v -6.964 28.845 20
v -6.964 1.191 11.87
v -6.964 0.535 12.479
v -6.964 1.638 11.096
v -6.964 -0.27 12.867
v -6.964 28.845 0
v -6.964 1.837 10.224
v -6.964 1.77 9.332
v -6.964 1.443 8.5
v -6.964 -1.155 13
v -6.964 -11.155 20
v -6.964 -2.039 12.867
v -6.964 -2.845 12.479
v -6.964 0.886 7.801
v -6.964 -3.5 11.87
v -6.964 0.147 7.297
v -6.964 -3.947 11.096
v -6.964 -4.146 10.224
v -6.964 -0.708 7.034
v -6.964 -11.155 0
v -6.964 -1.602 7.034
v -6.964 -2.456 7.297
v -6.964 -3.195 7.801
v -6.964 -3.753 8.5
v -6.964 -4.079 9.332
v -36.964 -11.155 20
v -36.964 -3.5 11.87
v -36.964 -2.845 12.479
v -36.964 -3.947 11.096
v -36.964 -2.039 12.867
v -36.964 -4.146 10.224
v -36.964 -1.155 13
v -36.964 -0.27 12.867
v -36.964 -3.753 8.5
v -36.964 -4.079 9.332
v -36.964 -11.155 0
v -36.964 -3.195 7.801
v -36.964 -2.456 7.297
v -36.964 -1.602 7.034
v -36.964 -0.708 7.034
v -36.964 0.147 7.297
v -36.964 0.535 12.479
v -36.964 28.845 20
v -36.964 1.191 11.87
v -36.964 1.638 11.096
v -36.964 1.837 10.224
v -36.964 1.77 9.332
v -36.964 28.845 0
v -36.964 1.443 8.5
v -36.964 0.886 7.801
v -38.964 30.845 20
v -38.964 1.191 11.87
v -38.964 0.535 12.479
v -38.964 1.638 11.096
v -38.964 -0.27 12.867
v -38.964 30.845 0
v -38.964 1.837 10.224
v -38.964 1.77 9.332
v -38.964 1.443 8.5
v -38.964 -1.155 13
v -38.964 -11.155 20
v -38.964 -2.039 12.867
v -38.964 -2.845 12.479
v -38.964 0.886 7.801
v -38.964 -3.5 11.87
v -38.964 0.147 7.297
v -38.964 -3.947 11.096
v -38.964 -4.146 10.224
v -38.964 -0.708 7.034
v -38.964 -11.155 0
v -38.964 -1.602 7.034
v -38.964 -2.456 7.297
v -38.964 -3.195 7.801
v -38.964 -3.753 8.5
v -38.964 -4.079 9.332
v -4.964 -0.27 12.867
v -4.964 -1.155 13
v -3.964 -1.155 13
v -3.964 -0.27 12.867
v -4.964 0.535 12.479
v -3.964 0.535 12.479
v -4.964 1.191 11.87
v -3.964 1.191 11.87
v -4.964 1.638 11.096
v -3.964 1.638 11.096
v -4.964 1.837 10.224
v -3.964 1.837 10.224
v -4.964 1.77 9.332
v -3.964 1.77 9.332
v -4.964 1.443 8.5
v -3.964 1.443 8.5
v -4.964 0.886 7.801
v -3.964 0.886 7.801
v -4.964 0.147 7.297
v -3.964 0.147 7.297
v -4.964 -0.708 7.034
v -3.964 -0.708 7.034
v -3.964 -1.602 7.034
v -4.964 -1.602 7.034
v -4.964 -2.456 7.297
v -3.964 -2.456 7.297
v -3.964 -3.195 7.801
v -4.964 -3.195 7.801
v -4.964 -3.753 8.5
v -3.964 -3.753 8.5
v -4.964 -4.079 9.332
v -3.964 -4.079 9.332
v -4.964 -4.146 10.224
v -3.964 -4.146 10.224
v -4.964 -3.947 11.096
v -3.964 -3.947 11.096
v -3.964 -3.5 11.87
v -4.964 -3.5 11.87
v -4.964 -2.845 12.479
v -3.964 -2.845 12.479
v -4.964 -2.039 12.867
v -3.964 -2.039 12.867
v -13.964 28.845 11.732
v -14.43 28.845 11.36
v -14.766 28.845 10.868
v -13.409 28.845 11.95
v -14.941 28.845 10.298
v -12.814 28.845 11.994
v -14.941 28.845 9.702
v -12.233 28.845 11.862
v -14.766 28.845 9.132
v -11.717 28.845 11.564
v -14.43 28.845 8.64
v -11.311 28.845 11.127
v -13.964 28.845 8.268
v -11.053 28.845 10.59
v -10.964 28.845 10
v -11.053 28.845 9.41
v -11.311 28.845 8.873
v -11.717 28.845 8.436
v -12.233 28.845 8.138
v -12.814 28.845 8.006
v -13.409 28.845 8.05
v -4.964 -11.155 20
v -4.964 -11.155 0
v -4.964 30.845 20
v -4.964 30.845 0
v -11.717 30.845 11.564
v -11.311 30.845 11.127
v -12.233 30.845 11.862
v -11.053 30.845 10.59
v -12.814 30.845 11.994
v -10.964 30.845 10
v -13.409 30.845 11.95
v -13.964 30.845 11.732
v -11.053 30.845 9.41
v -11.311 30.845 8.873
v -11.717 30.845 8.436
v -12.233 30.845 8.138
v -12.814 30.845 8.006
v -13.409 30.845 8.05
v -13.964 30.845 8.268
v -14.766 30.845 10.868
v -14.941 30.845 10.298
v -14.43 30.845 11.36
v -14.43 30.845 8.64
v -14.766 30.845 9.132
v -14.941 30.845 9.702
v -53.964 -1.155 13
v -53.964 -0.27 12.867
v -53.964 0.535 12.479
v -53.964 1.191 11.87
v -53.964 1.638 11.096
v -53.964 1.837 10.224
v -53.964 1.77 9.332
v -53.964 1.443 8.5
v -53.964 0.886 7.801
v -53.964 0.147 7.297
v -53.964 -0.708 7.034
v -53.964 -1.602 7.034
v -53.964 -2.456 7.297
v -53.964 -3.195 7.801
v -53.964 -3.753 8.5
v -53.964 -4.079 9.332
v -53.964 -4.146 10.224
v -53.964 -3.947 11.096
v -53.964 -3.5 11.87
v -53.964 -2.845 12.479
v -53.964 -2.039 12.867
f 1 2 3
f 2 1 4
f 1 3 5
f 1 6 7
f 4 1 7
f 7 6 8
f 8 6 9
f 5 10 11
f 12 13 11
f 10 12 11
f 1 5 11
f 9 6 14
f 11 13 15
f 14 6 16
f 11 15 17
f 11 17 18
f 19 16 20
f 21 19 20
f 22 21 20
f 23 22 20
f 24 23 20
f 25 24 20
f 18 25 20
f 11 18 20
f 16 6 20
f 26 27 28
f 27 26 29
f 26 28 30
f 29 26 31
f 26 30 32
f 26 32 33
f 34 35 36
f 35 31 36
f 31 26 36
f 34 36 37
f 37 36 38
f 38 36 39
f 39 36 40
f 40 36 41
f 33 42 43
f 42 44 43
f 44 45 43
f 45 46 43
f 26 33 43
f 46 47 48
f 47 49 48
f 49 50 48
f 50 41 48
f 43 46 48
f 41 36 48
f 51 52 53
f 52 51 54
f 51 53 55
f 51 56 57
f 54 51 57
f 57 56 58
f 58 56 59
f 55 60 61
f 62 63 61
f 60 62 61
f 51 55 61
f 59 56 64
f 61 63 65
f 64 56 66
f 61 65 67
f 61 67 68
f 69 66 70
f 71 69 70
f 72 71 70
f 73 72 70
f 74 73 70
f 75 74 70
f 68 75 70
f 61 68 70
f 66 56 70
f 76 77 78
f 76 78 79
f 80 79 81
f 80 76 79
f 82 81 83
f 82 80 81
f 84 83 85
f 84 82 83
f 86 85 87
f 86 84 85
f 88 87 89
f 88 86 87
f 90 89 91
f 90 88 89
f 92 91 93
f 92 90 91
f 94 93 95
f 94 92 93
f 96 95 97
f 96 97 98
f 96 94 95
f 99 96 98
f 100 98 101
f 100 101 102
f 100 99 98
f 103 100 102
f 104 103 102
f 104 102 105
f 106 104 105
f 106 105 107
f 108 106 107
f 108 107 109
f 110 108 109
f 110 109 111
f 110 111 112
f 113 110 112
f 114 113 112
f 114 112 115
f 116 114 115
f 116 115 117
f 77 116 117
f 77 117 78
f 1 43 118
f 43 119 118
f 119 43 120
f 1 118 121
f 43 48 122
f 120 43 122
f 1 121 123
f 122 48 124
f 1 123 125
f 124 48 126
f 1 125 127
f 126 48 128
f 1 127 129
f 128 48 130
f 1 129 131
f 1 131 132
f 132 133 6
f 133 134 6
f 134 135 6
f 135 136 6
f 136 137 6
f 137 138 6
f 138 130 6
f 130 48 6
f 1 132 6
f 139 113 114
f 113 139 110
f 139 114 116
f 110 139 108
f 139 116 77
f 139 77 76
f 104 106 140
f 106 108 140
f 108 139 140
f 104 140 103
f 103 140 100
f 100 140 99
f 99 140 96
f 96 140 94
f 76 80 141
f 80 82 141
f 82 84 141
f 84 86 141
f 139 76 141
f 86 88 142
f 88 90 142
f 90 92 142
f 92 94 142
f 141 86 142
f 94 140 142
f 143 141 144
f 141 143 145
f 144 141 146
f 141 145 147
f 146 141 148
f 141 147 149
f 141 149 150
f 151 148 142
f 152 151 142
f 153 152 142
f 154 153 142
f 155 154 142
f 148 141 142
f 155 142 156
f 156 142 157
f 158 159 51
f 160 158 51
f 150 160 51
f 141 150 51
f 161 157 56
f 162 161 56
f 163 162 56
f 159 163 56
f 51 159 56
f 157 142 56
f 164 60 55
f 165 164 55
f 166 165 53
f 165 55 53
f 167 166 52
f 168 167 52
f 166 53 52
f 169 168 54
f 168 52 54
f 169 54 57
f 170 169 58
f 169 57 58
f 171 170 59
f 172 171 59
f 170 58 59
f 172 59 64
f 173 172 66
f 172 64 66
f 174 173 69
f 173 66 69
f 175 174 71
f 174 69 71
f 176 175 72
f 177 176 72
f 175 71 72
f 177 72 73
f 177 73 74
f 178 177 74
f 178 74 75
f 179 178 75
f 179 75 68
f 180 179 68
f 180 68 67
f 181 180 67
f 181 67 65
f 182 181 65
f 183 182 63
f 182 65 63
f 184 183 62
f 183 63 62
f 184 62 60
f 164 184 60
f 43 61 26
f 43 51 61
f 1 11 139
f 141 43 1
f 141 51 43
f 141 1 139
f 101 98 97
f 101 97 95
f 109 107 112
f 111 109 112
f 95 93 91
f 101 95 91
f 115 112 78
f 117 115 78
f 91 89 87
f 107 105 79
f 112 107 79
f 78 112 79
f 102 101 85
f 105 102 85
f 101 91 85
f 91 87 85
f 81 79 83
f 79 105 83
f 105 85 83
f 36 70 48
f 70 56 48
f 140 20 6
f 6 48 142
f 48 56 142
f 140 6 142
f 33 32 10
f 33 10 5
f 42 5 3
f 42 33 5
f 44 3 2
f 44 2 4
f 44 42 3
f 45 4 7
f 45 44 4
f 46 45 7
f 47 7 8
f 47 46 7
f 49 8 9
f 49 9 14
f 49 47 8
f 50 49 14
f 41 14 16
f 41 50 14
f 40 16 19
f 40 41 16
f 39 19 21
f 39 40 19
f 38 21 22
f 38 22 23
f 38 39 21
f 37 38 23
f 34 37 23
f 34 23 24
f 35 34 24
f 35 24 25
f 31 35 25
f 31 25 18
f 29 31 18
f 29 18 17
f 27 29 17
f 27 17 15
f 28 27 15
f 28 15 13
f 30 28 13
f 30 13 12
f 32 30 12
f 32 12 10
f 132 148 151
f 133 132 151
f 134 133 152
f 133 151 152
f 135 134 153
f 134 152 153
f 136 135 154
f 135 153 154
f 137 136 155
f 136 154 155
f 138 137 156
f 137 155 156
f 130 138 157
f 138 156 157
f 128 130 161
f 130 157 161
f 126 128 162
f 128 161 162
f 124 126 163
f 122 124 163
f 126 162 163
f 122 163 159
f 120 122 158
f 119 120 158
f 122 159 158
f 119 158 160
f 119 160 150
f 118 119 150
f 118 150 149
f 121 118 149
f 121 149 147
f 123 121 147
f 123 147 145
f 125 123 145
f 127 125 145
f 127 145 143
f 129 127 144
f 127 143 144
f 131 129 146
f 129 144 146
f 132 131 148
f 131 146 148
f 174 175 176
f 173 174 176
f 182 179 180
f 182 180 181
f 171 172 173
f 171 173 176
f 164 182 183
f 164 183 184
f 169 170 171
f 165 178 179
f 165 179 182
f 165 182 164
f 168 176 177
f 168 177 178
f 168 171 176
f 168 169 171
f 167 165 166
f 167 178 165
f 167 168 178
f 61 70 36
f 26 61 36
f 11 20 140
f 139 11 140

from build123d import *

# Parameters (mm, degrees)
EXTRUDE_1_DEPTH      = 20
SKETCH_3_R           = 3
EXTRUDE_2_DEPTH      = 15
EXTRUDE_2_DEPTH_BACK = 35
SKETCH_4_R           = 2
CUT_EXTRUDE_1_DEPTH  = 2


with BuildPart() as part:
    # 草图1 → 凸台-拉伸1 (new body)
    with BuildSketch(Plane.XY):
        Polygon((-38.9636651, 28.845358616), (-38.9636651, -11.154641384), (-36.9636651, -11.154641384), (-36.9636651, 28.845358616), (-6.9636651, 28.845358616), (-6.9636651, -11.154641384), (-4.9636651, -11.154641384), (-4.9636651, 30.845358616), (-38.9636651, 30.845358616), align=None)
    extrude(amount=EXTRUDE_1_DEPTH)

    # 草图3 → 凸台-拉伸2 (add, two sides)
    with BuildSketch(Plane.ZY.offset(38.9636651)) as extrude_2_sk:
        with Locations((10, -1.154641384)):
            Circle(SKETCH_3_R)
    extrude(amount=EXTRUDE_2_DEPTH)
    extrude(extrude_2_sk.sketch, amount=-EXTRUDE_2_DEPTH_BACK)

    # 草图4 → 切除-拉伸1 (cut)
    with BuildSketch(Plane(origin=(0, 30.845358616, 0), x_dir=(1, 0, 0), z_dir=(0, 1, 0))):
        with Locations((-12.9636651, -10)):
            Circle(SKETCH_4_R)
    extrude(amount=-CUT_EXTRUDE_1_DEPTH, mode=Mode.SUBTRACT)


solid = part.part
